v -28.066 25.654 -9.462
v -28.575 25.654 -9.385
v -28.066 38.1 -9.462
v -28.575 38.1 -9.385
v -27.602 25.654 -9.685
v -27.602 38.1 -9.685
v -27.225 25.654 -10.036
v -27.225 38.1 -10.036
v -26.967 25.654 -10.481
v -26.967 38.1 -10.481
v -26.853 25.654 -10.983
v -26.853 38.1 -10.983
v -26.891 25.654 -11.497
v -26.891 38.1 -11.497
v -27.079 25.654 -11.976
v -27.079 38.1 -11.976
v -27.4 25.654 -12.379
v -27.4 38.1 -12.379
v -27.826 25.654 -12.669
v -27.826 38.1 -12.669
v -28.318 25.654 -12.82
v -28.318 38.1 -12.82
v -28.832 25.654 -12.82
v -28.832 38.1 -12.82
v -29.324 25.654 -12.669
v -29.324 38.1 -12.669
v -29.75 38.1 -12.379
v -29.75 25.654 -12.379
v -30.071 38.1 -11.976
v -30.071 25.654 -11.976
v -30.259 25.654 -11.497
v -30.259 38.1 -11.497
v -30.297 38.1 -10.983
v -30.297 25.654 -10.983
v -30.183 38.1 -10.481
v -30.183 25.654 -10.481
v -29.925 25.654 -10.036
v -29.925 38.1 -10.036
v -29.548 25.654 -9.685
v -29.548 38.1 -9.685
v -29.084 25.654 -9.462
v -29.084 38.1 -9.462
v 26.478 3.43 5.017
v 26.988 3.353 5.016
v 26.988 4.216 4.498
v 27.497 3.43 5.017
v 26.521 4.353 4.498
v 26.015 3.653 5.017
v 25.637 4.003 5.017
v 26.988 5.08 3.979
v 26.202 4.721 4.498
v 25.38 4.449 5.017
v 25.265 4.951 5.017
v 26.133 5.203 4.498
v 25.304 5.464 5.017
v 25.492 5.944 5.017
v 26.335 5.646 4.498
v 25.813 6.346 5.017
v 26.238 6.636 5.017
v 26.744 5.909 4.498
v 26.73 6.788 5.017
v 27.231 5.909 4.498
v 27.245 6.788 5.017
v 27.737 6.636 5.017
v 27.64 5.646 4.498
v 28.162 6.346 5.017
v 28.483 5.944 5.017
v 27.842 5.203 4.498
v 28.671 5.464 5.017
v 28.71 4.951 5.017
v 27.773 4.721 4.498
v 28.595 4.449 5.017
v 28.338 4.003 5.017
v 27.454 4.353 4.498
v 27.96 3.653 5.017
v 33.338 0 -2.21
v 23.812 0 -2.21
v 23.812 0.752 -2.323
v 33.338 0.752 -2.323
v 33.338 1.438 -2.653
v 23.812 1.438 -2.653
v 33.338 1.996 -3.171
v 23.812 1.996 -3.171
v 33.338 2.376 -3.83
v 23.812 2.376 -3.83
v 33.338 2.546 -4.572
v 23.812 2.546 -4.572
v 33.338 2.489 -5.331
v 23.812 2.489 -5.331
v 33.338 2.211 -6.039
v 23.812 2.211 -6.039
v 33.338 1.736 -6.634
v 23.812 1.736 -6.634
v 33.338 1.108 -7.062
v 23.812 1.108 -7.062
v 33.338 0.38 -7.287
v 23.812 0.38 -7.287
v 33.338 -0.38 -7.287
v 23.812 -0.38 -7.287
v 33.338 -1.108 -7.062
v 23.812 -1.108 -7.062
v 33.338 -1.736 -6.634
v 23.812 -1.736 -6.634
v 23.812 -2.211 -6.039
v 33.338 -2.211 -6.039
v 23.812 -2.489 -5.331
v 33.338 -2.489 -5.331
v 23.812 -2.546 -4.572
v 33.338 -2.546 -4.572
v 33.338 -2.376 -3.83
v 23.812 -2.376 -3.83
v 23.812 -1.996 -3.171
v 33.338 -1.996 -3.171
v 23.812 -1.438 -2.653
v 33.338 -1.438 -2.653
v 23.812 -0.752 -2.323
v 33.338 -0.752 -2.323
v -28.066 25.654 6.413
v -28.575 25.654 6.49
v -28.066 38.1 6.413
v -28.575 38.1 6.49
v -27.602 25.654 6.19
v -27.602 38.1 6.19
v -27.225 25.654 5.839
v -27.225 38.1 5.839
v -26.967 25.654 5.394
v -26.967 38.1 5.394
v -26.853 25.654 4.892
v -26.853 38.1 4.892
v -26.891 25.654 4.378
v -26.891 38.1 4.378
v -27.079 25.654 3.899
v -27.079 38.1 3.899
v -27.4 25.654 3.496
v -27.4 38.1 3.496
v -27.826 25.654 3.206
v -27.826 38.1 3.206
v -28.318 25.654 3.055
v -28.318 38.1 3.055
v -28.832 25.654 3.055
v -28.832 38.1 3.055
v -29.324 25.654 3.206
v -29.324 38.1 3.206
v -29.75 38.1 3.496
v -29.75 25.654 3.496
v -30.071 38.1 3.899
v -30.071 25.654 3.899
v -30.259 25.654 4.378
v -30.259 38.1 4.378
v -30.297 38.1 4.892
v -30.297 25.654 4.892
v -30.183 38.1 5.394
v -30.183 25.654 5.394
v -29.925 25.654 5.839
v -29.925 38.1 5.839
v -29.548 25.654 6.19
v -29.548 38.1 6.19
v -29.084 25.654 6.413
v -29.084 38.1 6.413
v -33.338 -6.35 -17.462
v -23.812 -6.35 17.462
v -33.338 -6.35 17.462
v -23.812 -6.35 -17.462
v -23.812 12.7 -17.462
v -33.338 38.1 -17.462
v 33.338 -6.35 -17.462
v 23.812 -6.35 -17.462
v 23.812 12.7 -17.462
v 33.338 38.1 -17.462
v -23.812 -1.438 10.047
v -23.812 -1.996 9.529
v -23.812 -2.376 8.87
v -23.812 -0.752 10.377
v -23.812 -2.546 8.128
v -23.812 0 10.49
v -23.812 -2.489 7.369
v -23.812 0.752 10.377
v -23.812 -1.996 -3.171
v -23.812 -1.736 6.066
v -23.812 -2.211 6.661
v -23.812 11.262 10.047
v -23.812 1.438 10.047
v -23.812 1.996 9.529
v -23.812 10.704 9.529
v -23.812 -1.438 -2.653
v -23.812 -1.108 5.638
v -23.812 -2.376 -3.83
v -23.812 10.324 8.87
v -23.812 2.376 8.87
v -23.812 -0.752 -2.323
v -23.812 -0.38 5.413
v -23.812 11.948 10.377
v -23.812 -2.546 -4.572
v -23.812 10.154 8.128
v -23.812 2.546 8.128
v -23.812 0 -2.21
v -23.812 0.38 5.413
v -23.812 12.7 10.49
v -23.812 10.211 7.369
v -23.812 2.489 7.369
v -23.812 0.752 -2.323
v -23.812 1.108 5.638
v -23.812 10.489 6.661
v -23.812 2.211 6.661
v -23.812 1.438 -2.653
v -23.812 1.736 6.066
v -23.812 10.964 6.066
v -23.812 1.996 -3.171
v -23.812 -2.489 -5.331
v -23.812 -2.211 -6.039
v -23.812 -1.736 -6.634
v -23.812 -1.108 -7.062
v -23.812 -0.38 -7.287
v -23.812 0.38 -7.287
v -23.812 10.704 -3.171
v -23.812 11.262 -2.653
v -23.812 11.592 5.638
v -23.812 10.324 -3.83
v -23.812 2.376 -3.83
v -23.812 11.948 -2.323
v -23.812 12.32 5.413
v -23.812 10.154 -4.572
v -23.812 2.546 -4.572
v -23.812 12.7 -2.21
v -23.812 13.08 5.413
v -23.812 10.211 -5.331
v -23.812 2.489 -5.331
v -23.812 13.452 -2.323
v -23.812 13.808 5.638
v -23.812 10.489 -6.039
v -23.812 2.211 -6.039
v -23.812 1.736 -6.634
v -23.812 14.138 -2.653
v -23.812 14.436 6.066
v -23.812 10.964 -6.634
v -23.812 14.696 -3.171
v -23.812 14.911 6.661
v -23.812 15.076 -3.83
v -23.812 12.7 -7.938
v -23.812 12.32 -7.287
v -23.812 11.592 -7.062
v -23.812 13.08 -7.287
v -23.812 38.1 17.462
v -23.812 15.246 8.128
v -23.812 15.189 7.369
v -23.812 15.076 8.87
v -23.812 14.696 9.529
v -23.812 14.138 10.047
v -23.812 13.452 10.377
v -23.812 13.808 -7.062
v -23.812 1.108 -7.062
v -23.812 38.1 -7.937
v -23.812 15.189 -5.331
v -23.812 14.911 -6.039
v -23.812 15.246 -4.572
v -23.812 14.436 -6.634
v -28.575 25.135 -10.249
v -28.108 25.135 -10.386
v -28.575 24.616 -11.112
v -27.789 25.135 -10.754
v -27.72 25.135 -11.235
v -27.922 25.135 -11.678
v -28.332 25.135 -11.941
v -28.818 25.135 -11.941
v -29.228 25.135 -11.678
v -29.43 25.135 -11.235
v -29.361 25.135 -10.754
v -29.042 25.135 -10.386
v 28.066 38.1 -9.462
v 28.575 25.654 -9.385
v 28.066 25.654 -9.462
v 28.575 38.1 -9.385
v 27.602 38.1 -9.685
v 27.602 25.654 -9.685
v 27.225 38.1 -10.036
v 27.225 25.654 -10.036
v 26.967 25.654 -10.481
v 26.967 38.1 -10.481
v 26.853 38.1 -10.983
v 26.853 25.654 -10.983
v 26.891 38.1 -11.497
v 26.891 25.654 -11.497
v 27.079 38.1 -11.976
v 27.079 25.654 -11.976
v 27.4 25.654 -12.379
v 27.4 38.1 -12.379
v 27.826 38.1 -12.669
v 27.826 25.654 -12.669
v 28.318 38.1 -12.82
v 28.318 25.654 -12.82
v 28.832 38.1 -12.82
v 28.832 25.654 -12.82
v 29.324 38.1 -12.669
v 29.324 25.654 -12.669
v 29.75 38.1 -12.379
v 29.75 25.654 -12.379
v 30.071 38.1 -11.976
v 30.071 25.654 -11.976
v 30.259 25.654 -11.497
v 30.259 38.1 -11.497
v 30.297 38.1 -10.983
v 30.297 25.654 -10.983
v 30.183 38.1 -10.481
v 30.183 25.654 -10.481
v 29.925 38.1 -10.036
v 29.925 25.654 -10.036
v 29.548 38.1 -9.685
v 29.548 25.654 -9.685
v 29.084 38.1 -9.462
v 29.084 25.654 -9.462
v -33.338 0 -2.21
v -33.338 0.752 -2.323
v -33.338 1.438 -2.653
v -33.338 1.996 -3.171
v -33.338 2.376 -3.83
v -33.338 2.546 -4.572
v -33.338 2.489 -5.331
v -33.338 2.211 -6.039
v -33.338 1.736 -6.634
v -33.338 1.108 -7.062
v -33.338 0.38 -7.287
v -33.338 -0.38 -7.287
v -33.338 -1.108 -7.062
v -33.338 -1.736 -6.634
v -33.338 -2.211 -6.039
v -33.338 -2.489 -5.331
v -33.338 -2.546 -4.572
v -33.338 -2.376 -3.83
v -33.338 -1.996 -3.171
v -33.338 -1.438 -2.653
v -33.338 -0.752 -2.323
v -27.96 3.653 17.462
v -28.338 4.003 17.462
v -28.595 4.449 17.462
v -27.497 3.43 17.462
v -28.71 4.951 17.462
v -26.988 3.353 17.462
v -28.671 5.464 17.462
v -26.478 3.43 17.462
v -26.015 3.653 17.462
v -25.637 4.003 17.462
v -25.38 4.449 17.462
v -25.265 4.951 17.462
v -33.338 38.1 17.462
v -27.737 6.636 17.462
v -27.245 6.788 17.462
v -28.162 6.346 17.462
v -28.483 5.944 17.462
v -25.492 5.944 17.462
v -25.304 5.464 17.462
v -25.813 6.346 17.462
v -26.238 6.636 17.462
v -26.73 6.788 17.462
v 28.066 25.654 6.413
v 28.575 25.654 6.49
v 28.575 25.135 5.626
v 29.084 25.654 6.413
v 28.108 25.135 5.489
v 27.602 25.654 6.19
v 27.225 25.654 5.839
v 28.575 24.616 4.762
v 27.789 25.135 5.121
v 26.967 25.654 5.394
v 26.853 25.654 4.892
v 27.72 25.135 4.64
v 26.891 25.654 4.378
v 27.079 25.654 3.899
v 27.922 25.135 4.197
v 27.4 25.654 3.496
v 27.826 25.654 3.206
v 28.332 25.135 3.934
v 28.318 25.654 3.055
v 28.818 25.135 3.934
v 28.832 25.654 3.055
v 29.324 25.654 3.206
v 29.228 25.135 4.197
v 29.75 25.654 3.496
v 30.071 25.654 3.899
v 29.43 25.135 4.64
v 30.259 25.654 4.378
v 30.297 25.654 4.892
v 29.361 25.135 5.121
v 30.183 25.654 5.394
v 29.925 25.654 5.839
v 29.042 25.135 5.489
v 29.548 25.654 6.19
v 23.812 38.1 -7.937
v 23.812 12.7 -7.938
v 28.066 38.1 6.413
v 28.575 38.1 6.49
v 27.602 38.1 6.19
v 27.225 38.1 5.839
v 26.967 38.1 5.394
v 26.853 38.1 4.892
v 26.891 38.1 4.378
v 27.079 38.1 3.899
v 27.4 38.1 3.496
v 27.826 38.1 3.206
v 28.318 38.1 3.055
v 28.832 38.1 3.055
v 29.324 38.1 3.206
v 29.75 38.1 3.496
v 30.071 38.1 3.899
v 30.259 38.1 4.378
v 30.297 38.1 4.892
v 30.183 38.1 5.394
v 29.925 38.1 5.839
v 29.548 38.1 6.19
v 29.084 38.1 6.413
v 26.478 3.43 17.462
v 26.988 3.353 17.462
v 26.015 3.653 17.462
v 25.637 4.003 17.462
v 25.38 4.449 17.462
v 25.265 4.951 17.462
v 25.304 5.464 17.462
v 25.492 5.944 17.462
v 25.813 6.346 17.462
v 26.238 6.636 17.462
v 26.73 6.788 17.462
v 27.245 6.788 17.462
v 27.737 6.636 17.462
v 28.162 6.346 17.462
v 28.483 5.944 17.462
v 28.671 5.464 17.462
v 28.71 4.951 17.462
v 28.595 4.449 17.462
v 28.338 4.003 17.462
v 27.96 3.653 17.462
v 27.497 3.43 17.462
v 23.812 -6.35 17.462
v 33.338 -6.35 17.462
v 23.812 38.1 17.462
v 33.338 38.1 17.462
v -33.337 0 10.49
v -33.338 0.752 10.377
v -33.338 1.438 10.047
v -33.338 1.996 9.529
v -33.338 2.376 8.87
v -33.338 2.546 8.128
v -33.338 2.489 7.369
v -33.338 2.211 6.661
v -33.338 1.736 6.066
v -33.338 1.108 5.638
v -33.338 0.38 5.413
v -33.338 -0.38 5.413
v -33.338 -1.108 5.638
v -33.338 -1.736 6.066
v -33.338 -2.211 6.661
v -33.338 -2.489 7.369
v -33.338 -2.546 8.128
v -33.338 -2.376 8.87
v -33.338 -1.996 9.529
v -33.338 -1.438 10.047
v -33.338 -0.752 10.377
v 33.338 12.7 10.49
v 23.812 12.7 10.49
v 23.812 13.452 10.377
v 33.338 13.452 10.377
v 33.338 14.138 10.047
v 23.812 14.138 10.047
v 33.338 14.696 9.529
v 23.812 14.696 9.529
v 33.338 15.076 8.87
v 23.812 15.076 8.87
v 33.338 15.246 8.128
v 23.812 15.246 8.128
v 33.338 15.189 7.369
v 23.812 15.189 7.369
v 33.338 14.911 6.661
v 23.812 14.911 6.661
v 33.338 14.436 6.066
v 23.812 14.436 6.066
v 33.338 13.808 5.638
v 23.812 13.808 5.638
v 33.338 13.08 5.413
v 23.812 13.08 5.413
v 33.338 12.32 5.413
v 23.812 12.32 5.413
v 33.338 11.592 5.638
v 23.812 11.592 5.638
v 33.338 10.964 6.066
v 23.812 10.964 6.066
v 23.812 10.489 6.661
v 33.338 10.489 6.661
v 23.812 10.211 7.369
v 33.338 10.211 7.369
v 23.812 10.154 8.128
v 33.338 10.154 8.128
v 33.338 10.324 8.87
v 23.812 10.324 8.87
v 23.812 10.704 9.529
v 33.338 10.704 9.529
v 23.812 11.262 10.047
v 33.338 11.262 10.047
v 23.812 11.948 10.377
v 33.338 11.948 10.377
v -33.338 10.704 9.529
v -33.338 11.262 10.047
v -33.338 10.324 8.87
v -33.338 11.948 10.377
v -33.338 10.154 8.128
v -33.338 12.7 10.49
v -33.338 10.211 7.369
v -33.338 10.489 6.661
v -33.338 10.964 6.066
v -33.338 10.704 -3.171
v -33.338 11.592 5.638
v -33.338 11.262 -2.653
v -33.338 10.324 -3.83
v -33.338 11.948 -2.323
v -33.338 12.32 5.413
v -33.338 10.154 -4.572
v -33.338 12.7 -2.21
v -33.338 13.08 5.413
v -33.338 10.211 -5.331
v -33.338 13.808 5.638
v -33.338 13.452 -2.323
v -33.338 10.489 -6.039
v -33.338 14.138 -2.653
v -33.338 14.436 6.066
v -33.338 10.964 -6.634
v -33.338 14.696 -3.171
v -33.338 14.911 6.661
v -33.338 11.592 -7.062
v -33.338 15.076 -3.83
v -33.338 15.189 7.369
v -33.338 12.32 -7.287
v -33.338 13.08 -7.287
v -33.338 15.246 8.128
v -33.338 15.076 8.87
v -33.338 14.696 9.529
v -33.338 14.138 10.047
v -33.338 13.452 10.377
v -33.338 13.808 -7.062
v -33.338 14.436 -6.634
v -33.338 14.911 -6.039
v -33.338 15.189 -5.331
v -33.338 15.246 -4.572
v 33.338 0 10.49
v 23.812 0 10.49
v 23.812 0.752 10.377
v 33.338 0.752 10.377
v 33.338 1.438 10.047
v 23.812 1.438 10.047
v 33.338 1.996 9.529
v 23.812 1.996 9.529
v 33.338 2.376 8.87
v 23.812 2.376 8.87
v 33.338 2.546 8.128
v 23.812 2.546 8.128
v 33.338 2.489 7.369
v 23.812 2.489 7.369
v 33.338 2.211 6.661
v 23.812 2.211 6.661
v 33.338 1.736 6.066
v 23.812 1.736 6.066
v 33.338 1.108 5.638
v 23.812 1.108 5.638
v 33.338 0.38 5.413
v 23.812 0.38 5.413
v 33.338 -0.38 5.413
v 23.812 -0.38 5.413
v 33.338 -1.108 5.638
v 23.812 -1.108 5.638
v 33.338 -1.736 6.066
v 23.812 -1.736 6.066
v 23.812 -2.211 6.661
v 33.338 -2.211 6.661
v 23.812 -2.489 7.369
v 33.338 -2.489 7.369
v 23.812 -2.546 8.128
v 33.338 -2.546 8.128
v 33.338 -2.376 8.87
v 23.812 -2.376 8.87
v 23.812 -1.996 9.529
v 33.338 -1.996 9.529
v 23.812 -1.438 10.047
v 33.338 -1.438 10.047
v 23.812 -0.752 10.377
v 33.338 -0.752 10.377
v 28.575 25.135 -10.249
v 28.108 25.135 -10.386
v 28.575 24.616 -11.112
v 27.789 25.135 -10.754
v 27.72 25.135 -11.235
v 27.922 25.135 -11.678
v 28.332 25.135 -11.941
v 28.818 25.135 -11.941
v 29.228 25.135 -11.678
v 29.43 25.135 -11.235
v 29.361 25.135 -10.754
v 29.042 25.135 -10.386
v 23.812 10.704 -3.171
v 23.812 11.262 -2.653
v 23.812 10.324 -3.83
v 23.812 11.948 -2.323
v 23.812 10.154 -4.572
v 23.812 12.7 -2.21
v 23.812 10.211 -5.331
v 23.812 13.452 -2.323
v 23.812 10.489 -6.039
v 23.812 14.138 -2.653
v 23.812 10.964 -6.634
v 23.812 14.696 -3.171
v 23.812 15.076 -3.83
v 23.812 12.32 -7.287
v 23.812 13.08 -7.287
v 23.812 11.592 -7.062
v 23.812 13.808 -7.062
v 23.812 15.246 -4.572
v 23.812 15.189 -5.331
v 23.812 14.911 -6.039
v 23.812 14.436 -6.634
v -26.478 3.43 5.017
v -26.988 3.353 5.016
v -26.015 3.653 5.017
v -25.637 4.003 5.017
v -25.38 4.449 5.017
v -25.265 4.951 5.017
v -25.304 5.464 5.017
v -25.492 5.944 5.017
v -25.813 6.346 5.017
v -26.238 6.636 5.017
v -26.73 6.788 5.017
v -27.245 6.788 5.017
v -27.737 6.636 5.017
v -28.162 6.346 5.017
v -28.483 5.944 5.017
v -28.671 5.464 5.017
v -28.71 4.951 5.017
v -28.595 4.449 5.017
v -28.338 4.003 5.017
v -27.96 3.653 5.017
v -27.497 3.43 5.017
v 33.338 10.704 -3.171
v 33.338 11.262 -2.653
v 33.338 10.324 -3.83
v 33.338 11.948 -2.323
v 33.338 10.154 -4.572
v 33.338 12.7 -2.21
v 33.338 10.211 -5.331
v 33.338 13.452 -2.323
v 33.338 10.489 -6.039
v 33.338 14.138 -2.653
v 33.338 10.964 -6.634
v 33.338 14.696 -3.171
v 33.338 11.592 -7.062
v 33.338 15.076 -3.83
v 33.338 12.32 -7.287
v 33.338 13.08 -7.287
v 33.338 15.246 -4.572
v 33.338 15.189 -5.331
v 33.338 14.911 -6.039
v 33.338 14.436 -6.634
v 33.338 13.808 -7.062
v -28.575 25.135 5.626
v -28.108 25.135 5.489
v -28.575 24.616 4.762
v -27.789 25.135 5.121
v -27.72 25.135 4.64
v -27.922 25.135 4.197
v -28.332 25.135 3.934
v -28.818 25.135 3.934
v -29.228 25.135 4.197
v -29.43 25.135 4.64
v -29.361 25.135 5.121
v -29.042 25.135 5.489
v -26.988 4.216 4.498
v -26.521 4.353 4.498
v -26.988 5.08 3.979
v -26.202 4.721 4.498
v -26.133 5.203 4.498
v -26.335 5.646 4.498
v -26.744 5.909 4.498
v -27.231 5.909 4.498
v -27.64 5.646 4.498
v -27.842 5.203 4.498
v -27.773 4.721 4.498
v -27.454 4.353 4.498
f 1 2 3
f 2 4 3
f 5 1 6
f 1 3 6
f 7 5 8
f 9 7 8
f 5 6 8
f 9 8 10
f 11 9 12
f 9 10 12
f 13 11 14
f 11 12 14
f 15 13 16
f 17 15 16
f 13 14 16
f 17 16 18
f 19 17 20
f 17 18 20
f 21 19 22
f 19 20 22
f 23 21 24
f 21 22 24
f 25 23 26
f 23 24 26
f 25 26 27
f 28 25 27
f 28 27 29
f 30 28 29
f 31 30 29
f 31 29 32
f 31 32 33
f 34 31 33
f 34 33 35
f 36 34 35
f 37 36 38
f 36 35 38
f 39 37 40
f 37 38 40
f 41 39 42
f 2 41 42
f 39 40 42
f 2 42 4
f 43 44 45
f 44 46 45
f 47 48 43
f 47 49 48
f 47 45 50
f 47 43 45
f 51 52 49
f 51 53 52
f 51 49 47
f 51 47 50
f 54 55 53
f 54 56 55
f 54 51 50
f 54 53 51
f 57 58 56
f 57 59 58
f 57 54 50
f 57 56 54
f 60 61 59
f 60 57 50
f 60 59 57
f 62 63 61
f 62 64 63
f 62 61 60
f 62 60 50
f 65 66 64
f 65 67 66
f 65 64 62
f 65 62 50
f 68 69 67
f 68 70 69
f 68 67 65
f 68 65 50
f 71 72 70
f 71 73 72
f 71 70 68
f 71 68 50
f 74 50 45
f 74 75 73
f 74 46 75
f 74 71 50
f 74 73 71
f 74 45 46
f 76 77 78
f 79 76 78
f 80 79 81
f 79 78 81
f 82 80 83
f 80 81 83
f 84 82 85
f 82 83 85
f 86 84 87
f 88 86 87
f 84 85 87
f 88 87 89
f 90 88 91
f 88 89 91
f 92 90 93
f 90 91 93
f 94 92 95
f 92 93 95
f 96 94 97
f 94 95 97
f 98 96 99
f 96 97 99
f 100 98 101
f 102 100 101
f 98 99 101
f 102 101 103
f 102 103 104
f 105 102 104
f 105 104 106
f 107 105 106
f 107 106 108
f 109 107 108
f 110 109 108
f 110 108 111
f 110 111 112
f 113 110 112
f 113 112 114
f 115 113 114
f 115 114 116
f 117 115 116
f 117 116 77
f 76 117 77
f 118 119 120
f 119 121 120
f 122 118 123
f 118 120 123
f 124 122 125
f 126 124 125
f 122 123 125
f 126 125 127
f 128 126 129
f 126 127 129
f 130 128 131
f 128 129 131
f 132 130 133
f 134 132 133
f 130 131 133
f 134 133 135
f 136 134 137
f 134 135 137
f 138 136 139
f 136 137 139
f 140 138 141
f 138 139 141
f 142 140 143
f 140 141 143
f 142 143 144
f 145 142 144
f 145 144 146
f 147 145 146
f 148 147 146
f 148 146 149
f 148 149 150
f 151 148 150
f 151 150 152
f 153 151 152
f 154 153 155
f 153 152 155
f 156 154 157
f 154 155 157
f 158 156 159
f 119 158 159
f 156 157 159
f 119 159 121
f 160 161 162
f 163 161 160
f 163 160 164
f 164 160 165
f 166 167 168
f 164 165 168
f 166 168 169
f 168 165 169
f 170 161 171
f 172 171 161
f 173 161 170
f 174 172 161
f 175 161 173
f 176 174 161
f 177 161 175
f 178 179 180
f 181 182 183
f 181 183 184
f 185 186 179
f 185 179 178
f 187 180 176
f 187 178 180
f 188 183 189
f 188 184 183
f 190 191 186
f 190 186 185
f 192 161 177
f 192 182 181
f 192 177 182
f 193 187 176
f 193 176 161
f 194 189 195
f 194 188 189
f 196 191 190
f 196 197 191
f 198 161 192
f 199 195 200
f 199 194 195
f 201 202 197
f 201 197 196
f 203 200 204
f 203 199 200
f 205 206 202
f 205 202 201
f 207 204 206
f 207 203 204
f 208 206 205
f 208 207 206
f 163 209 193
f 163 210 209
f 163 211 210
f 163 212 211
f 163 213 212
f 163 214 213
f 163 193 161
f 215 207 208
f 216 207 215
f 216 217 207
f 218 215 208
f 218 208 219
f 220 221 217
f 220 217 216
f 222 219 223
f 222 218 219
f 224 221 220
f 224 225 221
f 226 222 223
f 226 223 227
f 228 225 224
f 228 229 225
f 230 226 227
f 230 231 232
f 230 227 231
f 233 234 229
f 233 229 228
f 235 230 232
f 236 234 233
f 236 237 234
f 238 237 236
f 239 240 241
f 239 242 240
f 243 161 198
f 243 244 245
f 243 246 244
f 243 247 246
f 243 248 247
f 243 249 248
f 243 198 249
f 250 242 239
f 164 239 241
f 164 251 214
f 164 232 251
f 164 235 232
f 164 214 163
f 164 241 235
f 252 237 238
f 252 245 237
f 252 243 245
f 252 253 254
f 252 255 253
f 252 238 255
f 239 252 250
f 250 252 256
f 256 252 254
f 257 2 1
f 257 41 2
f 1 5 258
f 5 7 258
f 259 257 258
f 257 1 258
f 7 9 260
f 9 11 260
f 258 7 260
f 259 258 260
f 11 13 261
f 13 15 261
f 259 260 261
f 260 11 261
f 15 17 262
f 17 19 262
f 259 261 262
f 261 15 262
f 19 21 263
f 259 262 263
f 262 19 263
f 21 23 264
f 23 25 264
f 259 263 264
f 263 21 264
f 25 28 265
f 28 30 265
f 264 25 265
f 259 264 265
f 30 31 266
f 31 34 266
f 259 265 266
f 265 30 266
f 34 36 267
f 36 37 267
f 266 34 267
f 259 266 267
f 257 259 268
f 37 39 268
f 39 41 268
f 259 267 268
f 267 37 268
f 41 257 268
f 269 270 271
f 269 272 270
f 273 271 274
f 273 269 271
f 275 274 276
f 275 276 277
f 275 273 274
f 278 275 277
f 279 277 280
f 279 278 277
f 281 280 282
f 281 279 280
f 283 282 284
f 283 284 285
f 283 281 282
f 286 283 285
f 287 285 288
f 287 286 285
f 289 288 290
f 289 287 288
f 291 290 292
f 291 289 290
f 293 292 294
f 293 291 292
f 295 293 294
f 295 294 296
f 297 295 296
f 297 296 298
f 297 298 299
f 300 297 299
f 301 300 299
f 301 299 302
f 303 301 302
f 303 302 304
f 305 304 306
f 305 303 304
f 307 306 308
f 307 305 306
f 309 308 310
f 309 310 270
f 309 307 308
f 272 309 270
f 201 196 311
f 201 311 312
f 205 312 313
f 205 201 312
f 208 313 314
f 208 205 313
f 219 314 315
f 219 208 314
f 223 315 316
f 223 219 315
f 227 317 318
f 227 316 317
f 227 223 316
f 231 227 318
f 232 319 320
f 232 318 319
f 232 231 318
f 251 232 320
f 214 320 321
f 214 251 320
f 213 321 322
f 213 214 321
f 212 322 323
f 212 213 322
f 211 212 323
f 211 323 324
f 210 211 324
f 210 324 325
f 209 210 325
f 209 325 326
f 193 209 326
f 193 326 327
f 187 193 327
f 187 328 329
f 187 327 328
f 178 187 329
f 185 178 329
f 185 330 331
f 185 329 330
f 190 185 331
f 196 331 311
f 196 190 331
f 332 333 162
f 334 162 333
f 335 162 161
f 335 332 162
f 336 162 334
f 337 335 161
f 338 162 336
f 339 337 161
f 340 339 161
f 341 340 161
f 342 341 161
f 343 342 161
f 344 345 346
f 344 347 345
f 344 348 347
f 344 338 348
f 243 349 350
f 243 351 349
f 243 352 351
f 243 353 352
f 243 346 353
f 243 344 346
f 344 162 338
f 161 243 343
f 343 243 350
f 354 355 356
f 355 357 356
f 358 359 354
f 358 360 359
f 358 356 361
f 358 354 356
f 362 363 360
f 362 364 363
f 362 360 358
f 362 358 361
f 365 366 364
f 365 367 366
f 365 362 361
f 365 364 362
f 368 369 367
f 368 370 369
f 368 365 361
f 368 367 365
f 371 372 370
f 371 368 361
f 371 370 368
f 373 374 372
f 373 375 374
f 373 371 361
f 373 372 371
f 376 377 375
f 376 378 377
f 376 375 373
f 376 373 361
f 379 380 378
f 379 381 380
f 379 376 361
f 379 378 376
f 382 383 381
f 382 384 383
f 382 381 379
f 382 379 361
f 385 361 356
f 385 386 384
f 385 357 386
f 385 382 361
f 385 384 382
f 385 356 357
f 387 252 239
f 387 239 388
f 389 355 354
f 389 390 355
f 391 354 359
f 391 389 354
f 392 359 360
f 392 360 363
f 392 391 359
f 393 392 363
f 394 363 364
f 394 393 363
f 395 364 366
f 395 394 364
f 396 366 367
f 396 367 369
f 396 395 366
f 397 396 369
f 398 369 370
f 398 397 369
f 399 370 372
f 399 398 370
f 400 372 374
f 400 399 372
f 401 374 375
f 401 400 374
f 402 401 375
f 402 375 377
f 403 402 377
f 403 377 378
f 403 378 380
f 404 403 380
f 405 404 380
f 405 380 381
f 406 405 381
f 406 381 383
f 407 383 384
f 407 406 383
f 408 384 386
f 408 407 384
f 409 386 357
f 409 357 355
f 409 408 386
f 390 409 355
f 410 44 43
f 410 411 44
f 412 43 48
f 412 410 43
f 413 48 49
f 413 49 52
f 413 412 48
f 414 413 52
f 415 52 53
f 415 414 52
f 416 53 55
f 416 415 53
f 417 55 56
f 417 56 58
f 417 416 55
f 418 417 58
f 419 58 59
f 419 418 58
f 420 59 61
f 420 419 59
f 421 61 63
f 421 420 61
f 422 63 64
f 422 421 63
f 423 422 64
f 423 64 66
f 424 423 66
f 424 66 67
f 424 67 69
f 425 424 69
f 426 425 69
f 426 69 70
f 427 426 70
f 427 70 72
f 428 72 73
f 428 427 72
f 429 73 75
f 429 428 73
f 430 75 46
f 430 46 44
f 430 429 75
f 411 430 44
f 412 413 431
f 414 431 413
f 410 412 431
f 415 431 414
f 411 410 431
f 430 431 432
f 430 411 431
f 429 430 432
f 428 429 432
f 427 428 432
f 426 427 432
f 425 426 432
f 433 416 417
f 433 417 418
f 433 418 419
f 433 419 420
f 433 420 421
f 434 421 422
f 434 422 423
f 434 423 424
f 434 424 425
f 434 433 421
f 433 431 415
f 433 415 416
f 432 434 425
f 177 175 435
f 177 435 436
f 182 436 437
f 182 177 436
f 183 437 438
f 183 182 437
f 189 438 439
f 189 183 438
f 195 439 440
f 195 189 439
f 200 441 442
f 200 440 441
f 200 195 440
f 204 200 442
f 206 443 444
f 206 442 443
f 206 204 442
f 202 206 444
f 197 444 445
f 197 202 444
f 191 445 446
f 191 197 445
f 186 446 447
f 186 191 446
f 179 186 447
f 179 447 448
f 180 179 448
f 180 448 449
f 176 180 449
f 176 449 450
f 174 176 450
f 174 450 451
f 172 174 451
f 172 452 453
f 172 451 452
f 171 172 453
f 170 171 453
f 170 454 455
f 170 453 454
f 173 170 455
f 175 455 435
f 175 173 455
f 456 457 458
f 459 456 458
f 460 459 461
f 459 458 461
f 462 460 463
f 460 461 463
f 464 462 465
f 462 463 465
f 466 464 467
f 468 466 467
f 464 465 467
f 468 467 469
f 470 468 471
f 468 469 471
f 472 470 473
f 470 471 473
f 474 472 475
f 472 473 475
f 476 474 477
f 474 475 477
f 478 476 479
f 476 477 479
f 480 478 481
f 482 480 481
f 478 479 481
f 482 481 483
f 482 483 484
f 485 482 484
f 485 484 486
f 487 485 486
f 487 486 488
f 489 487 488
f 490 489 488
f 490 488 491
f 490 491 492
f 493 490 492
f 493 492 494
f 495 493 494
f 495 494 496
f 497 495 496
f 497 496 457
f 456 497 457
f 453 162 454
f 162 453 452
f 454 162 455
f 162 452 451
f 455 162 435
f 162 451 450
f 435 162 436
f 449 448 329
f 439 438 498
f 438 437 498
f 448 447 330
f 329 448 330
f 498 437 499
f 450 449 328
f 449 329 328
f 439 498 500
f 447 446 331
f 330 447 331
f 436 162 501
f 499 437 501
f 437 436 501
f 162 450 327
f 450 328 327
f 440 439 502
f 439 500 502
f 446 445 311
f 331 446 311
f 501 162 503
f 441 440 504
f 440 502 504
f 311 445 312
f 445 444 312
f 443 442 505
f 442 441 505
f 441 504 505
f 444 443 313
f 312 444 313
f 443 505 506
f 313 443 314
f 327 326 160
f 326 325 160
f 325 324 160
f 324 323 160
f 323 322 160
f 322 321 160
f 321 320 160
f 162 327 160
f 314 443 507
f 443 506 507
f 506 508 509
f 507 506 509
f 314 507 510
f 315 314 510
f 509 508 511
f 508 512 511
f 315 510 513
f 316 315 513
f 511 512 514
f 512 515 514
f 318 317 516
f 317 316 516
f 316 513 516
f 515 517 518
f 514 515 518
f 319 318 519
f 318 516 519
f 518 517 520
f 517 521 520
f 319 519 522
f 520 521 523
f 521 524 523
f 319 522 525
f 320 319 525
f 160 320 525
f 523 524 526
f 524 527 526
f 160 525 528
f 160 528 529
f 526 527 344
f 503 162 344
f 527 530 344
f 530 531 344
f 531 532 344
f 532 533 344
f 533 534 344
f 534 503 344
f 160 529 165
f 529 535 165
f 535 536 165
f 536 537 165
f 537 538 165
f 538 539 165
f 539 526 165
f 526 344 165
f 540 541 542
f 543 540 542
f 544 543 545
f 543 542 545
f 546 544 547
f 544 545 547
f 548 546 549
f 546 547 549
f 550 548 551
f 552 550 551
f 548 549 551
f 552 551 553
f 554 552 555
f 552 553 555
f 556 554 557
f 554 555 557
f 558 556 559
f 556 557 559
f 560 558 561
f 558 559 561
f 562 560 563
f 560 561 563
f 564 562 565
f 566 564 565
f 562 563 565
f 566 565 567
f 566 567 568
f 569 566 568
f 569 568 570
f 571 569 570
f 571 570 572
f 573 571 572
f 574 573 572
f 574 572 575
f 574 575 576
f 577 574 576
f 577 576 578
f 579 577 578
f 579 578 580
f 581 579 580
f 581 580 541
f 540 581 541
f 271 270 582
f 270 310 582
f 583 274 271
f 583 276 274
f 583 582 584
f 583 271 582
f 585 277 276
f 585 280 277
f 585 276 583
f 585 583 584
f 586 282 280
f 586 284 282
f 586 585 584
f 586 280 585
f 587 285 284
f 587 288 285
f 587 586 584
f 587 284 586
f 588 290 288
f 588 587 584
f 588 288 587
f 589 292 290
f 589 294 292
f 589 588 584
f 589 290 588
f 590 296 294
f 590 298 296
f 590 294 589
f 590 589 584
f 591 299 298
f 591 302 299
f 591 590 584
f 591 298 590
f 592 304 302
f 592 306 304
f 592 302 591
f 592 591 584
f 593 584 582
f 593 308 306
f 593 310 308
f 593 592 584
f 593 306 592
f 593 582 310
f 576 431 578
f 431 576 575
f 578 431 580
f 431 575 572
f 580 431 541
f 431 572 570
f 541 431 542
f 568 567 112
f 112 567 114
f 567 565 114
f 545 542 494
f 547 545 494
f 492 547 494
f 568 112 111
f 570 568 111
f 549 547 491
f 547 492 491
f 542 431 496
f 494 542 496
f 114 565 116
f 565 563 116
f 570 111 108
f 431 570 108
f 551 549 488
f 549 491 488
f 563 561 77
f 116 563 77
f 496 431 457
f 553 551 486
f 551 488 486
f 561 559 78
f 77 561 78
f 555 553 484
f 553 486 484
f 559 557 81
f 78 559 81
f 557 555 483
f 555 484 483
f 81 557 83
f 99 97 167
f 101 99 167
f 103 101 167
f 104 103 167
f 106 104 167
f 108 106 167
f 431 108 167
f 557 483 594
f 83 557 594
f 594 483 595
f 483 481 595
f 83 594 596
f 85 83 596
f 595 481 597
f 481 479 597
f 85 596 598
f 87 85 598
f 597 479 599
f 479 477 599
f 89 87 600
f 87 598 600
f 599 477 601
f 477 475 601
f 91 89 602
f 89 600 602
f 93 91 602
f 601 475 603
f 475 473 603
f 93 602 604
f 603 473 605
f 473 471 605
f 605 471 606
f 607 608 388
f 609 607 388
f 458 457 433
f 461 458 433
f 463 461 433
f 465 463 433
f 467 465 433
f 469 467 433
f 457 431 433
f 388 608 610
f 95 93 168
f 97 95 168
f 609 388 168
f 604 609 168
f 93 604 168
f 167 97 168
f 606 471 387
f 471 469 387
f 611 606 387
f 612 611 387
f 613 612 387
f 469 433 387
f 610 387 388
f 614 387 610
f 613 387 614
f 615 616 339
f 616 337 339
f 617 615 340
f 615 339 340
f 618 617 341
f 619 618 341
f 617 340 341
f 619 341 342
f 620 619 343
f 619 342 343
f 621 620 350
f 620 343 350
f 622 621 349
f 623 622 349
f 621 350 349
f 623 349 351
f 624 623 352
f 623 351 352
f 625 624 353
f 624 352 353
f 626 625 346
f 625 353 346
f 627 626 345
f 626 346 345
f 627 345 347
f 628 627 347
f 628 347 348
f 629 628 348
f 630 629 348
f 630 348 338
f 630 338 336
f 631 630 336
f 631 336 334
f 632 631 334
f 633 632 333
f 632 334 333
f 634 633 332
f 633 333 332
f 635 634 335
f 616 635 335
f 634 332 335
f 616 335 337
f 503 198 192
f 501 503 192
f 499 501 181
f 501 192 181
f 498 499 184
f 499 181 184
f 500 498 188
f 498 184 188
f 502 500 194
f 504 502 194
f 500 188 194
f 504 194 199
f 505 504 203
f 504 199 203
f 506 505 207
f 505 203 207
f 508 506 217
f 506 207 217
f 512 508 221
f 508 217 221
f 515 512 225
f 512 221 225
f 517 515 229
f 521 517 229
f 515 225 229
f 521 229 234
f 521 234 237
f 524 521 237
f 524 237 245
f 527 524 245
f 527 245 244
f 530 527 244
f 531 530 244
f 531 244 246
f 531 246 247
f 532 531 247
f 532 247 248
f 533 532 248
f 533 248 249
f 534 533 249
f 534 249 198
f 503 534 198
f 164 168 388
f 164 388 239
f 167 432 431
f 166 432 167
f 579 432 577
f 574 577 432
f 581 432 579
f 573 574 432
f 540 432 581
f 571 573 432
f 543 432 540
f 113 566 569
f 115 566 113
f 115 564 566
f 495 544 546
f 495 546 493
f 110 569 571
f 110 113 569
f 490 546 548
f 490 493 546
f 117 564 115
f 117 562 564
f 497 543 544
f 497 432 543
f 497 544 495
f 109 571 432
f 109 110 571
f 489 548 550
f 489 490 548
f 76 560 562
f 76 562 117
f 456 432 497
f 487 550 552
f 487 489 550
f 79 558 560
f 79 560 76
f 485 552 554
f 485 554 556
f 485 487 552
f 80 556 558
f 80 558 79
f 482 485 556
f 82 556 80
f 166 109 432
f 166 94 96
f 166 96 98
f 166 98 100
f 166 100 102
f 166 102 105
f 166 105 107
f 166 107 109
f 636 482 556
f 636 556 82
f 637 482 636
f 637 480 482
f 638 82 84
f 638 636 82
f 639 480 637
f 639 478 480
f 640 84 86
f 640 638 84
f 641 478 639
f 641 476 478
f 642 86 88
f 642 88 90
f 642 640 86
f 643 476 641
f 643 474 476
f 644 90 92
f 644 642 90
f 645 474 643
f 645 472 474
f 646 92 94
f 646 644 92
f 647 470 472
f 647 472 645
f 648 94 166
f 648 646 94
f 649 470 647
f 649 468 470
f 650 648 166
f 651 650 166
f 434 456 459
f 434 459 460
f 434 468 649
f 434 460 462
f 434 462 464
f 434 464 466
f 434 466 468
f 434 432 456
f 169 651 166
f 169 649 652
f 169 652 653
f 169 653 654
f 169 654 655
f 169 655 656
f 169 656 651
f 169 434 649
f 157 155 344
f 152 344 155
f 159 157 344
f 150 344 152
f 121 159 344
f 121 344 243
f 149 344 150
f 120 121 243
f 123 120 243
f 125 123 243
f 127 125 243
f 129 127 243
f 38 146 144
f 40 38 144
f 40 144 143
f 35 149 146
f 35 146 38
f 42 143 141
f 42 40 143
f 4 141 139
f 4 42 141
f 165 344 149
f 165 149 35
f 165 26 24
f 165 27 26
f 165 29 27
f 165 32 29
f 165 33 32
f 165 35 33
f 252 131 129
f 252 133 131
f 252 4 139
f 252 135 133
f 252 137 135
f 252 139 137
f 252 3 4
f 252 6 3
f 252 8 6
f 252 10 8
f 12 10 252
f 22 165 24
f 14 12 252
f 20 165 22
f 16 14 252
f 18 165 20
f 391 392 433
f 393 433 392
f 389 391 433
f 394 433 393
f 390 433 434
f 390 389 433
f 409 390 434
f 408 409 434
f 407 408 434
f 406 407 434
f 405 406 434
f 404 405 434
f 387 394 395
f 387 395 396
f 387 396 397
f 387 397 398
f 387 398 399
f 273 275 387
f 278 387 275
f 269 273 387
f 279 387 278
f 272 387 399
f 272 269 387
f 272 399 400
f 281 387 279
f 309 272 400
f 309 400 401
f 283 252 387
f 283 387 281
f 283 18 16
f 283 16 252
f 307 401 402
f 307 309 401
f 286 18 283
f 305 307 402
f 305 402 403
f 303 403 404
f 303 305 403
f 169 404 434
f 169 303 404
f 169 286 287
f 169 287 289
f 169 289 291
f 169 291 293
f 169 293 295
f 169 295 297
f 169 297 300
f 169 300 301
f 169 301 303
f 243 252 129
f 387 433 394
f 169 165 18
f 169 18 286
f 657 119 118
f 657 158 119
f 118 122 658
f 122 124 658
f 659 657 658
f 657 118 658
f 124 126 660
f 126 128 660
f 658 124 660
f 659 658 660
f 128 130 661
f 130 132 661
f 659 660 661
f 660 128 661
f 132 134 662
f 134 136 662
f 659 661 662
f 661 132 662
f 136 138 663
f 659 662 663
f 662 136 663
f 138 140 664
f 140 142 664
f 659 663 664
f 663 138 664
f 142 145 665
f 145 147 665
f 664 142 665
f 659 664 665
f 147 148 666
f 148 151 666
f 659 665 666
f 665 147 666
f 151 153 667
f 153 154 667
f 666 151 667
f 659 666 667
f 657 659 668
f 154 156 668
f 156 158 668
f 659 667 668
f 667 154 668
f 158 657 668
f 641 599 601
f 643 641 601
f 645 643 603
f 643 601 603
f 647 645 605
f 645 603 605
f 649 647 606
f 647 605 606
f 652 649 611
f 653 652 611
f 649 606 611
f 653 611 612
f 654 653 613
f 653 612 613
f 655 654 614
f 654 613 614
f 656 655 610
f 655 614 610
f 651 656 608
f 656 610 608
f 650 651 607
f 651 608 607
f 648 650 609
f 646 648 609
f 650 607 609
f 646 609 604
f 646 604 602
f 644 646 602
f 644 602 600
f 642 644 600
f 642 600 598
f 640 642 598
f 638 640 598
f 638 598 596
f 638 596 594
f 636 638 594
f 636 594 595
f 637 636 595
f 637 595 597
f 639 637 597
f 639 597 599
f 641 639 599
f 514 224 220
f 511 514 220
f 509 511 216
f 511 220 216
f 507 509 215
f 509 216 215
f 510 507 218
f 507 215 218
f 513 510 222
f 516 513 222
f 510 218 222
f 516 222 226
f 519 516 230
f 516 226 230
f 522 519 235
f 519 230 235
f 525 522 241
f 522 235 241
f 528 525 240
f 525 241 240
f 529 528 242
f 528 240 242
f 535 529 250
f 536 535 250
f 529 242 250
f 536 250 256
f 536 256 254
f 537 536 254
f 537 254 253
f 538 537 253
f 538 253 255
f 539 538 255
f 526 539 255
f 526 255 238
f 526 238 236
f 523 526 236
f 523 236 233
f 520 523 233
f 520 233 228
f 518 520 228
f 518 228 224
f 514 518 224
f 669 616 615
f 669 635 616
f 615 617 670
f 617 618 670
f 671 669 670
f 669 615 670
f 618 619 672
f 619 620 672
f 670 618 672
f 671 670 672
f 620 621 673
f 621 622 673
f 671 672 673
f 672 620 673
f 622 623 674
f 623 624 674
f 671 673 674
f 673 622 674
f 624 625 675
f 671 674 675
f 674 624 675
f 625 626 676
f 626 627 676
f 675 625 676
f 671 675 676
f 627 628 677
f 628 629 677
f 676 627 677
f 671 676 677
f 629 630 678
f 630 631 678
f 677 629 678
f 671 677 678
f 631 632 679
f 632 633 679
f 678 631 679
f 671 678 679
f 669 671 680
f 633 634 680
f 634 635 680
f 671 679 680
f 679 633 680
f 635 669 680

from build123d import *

# Parameters (mm, degrees)
SKETCH1_W                      = 66.675
SKETCH1_H                      = 34.925
BOSS_EXTRUDE1_DEPTH            = 38.1
SKETCH2_W                      = 47.625
SKETCH2_H                      = 25.4
CUT_EXTRUDE1_DEPTH             = 85.986868471
SKETCH3_W                      = 34.925
SKETCH3_H                      = 31.75
CUT_EXTRUDE2_DEPTH             = 79.753441393
SKETCH4_W                      = 47.625
SKETCH4_H                      = 38.1
CUT_EXTRUDE3_DEPTH             = 62.504101743
F_1_4_20_TAPPED_HOLE1_D        = 5.1054
F_1_4_20_TAPPED_HOLE1_DEPTH    = 9.526
F_8_32_TAPPED_HOLE2_AT_2_COUNT = 2
F_8_32_TAPPED_HOLE2_AT_2_PITCH = 15.875
LPATTERN1_COUNT                = 2
LPATTERN1_PITCH                = 12.7
MIRROR1_COPY_2_D               = 5.1054
MIRROR1_COPY_2_DEPTH           = 9.526


with BuildPart() as part:
    # Sketch1 → Boss-Extrude1 (new, symmetric)
    with BuildSketch(Plane(origin=(0, 0, 0), x_dir=(1, 0, 0), z_dir=(0, 1, 0))):
        Rectangle(SKETCH1_W, SKETCH1_H)
    extrude(amount=BOSS_EXTRUDE1_DEPTH, both=True)

    # Sketch2 → Cut-Extrude1 (cut, through all)
    with BuildSketch(Plane(origin=(0, 38.1, 0), x_dir=(1, 0, 0), z_dir=(0, 1, 0))):
        with Locations((0, -4.7625)):
            Rectangle(SKETCH2_W, SKETCH2_H)
    extrude(amount=-CUT_EXTRUDE1_DEPTH, mode=Mode.SUBTRACT)

    # Sketch3 → Cut-Extrude2 (cut, through all)
    with BuildSketch(Plane(origin=(33.3375, 0, 0), x_dir=(0, 0, -1), z_dir=(1, 0, 0))):
        with Locations((0, -22.225)):
            Rectangle(SKETCH3_W, SKETCH3_H)
    extrude(amount=-CUT_EXTRUDE2_DEPTH, mode=Mode.SUBTRACT)

    # Sketch4 → Cut-Extrude3 (cut, through all)
    with BuildSketch(Plane(origin=(0, 0, -17.4625), x_dir=(-1, 0, 0), z_dir=(0, 0, -1))):
        with Locations((0, -6.35)):
            Rectangle(SKETCH4_W, SKETCH4_H)
    extrude(amount=-CUT_EXTRUDE3_DEPTH, mode=Mode.SUBTRACT)

    # 1/4-20 Tapped Hole1
    with Locations(Plane(origin=(33.3375, 0, 0), x_dir=(0, 0, -1), z_dir=(1, 0, 0))):
        with Locations((-7.9375, 0), (4.7625, 0)):
            f_1_4_20_tapped_hole1 = Hole(F_1_4_20_TAPPED_HOLE1_D / 2, depth=F_1_4_20_TAPPED_HOLE1_DEPTH)

    # Sketch7 → #8-32 Tapped Hole1 (revolve, cut)
    with BuildSketch(Plane(origin=(26.9875, 5.08, 17.4625), x_dir=(0, -1, 0), z_dir=(1, 0, 0))):
        Polygon((0, 0), (0, 13.483806461), (1.7272, 12.446), (1.7272, 0), align=None)
    f_8_32_tapped_hole1 = revolve(axis=Axis((26.9875, 5.08, 23.8125), (0, 0, -1)), mode=Mode.SUBTRACT)

    # Sketch9 → #8-32 Tapped Hole2 (revolve, cut)
    with BuildSketch(Plane(origin=(28.575, 38.1, 4.7625), x_dir=(0, 0, 1), z_dir=(1, 0, 0))):
        Polygon((0, 0), (0, 13.483806461), (1.7272, 12.446), (1.7272, 0), align=None)
    f_8_32_tapped_hole2 = revolve(axis=Axis((28.575, 44.45, 4.7625), (0, -1, 0)), mode=Mode.SUBTRACT)

    # #8-32 Tapped Hole2 at 2: #8-32 Tapped Hole2 ×2
    with Locations(*[(0, 0, -i * F_8_32_TAPPED_HOLE2_AT_2_PITCH) for i in range(1, F_8_32_TAPPED_HOLE2_AT_2_COUNT)]):
        add(f_8_32_tapped_hole2, mode=Mode.SUBTRACT)

    # LPattern1: 1/4-20 Tapped Hole1 ×2
    with Locations(*[(0, i * LPATTERN1_PITCH, 0) for i in range(1, LPATTERN1_COUNT)]):
        add(f_1_4_20_tapped_hole1, mode=Mode.SUBTRACT)

    # Mirror1: 1/4-20 Tapped Hole1, #8-32 Tapped Hole1, #8-32 Tapped Hole2 across plane
    add(f_1_4_20_tapped_hole1.mirror(Plane(origin=(0, 0, 0), x_dir=(0, 0, 1), z_dir=(1, 0, 0))), mode=Mode.SUBTRACT)
    add(f_8_32_tapped_hole1.mirror(Plane(origin=(0, 0, 0), x_dir=(0, 0, 1), z_dir=(1, 0, 0))), mode=Mode.SUBTRACT)
    add(f_8_32_tapped_hole2.mirror(Plane(origin=(0, 0, 0), x_dir=(0, 0, 1), z_dir=(1, 0, 0))), mode=Mode.SUBTRACT)

    # Mirror1 copy 1 sketch → Mirror1 copy 1 (revolve, cut)
    with BuildSketch(Plane(origin=(-28.575, 38.1, -11.1125), x_dir=(0, 0, 1), z_dir=(-1, 0, 0))):
        Polygon((0, 0), (0, -13.483806461), (1.7272, -12.446), (1.7272, 0), align=None)
    revolve(axis=Axis((-28.575, 44.45, -11.1125), (0, 1, 0)), mode=Mode.SUBTRACT)

    # Mirror1 copy 2
    with Locations(Plane(origin=(-33.3375, 12.7, 0), x_dir=(0, 0, -1), z_dir=(-1, 0, 0))):
        with Locations((-7.9375, 0), (4.7625, 0)):
            Hole(MIRROR1_COPY_2_D / 2, depth=MIRROR1_COPY_2_DEPTH)


solid = part.part
